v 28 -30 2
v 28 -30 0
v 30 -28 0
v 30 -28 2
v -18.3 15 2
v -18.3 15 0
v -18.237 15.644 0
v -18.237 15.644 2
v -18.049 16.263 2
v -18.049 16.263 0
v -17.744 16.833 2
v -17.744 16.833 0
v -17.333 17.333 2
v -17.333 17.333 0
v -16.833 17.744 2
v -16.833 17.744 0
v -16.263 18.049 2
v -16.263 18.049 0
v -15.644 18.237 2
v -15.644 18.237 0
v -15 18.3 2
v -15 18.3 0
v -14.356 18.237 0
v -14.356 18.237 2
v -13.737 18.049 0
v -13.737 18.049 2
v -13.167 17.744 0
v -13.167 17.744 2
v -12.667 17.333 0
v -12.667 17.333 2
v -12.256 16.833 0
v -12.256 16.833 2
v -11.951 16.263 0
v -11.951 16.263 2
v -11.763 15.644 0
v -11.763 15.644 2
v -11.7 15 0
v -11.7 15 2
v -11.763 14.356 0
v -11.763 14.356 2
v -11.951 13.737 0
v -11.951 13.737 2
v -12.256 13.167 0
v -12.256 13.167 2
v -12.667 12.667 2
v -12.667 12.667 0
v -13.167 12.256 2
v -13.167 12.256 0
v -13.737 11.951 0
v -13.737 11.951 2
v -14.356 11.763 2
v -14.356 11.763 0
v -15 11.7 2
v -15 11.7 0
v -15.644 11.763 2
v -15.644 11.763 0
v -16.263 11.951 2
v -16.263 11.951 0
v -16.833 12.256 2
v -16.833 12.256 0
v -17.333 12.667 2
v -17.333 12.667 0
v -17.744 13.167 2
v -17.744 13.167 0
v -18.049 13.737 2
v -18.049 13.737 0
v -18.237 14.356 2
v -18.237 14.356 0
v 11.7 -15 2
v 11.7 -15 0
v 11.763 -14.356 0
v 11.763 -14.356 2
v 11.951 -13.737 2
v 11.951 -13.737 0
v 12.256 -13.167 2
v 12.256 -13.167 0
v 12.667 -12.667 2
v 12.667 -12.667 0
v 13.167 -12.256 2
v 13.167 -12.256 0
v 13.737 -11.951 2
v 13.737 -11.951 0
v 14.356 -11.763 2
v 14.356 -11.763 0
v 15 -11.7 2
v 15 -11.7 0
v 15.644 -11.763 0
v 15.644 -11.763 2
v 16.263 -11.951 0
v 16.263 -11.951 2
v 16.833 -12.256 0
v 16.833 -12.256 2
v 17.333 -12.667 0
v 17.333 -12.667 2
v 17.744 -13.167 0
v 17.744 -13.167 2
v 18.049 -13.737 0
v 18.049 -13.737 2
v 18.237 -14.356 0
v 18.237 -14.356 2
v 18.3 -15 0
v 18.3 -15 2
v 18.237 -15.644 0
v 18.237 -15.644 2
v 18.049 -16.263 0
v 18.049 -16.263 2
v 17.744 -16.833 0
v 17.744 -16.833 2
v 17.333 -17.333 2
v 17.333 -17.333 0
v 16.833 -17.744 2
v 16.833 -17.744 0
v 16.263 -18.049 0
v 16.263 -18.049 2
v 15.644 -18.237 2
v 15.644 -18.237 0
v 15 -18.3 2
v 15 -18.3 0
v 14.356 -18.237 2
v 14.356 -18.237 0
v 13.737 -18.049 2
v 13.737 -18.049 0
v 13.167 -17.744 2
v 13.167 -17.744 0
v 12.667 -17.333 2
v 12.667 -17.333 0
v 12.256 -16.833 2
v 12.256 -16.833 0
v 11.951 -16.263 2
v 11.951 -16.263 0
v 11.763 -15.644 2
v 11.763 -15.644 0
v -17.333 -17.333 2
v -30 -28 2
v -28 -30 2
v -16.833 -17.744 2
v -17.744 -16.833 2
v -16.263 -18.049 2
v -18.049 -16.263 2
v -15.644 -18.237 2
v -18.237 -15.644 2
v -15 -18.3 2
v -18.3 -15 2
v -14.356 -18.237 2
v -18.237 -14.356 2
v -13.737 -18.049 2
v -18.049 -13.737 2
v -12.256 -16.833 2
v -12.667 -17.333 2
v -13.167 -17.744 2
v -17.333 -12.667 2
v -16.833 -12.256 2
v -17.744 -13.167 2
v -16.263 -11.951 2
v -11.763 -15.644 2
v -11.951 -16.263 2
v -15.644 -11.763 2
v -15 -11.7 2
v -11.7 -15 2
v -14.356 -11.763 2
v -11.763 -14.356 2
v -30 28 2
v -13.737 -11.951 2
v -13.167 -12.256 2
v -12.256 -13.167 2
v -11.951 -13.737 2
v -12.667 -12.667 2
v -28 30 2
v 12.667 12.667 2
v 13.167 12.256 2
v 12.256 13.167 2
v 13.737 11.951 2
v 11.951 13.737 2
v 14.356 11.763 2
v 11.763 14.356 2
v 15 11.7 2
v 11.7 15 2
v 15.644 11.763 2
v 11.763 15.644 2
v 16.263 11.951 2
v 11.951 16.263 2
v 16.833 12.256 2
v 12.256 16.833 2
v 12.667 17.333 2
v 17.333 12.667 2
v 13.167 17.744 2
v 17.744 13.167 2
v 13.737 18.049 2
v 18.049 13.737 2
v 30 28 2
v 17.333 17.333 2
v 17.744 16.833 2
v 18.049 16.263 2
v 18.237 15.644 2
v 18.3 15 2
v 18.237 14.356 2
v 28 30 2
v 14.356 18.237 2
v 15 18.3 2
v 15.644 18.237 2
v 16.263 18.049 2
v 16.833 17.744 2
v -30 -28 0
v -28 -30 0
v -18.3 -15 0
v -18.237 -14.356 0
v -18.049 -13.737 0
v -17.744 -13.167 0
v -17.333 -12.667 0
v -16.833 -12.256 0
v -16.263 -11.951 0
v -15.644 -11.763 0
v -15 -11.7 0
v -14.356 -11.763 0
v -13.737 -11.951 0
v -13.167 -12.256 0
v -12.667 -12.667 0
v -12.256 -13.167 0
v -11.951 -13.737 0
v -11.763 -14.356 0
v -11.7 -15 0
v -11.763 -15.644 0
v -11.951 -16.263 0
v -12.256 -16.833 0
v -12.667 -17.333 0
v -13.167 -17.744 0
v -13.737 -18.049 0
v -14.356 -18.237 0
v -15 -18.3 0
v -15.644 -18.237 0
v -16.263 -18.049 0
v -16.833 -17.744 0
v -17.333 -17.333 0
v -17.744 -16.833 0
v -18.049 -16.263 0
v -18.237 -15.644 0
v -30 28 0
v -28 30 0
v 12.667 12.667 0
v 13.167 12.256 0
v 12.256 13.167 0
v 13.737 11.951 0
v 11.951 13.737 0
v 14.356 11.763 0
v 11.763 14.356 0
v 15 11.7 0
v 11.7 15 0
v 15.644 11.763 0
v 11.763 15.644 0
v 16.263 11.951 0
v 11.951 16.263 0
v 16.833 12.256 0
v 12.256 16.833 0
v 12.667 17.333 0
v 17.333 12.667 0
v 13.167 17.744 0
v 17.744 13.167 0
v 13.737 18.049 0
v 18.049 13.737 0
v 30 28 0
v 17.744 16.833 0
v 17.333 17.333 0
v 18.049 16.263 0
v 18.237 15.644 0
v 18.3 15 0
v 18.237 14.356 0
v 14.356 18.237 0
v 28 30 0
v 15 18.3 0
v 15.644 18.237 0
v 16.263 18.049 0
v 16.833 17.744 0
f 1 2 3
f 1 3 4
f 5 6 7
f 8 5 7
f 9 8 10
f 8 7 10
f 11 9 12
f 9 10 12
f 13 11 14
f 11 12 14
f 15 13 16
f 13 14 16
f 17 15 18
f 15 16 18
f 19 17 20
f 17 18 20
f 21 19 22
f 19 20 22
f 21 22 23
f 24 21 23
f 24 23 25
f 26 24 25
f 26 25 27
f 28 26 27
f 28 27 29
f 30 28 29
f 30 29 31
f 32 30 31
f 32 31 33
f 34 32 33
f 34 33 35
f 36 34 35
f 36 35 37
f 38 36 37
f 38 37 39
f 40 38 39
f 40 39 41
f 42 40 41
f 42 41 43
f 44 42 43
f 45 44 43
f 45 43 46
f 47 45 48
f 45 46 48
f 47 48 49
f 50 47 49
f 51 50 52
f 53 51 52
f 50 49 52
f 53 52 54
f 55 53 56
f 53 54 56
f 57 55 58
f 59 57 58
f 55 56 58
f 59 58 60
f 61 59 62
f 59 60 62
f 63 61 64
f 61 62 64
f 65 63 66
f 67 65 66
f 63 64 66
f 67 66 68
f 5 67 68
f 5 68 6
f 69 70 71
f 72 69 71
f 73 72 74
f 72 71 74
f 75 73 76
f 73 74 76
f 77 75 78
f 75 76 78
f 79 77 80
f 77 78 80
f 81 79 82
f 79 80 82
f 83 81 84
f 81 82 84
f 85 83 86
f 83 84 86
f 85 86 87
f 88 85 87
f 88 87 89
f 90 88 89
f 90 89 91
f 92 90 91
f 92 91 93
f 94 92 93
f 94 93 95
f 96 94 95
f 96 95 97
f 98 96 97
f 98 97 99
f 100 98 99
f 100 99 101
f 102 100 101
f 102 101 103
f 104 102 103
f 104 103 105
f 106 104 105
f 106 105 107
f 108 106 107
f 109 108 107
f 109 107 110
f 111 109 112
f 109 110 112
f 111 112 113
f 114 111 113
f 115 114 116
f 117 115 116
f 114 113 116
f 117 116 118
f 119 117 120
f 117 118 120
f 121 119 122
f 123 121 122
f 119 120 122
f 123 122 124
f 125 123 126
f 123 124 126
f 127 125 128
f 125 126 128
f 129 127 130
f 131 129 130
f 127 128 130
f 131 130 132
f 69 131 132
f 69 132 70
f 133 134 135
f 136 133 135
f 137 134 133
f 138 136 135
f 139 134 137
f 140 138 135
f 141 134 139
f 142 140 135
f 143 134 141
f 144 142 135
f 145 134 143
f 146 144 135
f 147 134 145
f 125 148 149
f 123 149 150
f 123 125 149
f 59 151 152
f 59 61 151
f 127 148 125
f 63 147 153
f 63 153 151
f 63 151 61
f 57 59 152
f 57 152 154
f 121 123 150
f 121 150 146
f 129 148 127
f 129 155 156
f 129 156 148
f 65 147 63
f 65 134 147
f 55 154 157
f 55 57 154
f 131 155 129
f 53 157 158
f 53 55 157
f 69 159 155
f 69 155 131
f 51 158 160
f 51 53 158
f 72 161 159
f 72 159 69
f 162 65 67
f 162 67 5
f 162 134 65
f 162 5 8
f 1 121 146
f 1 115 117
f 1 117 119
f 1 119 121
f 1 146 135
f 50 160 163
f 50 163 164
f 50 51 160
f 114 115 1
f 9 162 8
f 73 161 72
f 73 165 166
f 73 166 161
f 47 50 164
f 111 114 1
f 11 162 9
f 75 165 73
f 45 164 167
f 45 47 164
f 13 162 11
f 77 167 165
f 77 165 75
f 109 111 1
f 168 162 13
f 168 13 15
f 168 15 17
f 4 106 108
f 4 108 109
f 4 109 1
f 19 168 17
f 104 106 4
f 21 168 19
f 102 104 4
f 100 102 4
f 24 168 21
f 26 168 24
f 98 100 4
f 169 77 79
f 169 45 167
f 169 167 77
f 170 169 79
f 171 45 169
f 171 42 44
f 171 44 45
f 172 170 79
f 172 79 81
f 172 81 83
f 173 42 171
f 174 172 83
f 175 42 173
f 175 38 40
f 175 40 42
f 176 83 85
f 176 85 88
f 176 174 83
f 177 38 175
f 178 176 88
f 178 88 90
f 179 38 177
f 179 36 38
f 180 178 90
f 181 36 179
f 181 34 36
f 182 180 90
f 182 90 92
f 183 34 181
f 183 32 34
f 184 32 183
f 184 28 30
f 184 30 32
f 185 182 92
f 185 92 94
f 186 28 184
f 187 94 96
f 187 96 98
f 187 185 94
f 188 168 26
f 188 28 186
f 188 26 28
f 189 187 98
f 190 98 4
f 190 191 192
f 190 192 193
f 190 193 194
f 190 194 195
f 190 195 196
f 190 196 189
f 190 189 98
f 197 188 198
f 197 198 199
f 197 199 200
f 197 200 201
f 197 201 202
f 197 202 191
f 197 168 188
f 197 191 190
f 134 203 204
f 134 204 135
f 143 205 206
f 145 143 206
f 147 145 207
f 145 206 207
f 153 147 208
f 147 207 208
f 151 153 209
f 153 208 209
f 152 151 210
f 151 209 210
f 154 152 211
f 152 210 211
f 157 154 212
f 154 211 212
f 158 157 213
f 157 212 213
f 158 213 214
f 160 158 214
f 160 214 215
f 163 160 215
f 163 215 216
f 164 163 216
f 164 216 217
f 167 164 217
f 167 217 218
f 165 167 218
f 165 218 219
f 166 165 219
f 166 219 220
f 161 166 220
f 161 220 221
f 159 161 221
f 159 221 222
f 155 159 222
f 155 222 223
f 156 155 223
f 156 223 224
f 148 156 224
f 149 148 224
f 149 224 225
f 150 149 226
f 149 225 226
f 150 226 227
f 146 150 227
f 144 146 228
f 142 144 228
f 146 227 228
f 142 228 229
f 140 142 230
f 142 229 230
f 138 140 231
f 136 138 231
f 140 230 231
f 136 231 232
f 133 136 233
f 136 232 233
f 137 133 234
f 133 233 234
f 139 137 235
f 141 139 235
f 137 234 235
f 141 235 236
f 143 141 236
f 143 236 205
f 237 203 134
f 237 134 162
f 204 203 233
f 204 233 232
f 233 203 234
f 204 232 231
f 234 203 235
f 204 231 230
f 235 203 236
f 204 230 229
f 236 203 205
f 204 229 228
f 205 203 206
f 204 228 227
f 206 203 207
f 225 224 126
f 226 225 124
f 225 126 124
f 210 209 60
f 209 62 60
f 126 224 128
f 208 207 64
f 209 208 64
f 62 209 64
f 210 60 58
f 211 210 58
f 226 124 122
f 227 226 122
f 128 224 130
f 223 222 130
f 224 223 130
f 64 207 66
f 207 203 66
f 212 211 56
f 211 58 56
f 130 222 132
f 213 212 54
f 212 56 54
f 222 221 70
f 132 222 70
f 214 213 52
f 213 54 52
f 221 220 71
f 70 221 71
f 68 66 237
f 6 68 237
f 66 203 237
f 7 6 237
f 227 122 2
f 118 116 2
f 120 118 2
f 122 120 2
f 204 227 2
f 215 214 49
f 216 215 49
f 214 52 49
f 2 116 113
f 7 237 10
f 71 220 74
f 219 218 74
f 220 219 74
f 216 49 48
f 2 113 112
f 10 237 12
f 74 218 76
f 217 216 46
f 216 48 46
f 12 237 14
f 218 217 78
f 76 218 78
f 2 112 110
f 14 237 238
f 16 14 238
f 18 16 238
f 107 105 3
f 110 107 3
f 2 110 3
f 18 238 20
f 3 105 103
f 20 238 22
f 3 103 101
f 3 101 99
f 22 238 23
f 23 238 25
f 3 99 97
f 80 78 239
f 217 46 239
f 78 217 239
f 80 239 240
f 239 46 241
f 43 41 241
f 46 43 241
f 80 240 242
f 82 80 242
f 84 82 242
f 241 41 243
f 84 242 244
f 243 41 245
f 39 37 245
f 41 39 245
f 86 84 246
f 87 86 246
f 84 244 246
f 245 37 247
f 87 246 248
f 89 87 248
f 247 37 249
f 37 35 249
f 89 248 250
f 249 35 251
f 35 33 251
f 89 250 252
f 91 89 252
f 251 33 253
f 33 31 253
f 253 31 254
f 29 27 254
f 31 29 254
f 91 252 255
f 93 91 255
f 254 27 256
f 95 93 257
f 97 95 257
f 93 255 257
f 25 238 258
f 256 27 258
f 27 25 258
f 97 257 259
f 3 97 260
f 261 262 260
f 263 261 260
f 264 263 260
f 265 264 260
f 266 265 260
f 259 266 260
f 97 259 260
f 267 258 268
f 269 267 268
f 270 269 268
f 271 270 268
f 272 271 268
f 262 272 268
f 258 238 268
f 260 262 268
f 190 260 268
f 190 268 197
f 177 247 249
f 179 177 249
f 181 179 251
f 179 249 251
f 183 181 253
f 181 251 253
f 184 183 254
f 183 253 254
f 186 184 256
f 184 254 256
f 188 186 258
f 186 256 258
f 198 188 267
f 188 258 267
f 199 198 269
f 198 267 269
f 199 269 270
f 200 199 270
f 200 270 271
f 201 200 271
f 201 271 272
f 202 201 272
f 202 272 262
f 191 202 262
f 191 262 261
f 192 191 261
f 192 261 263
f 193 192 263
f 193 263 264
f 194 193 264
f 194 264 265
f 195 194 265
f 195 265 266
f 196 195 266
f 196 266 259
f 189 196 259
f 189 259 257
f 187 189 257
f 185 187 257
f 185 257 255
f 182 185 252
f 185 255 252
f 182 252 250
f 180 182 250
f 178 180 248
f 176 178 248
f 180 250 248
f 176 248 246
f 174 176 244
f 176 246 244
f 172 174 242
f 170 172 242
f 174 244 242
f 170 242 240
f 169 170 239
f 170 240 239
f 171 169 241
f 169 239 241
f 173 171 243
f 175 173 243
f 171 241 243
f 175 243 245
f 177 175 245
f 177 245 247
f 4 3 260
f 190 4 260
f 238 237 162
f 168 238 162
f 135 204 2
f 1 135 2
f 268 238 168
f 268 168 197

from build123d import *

# Parameters (mm, degrees)
SKETCH_1_W        = 60
SKETCH_1_H        = 60
EXTRUDE_1_DEPTH   = 2
CHAMFER_1_SIZE    = 2
HOLE_WIZARD_M61_D = 6.6


with BuildPart() as part:
    # Эскиз1 → Бобышка-Вытянуть1 (new body)
    with BuildSketch(Plane.XY):
        Rectangle(SKETCH_1_W, SKETCH_1_H)
    extrude(amount=EXTRUDE_1_DEPTH)

    # Фаска1
    chamfer_1_edges = [part.edges().sort_by_distance(p)[0] for p in [
        (30, -30, 1),
        (-30, -30, 1),
        (-30, 30, 1),
        (30, 30, 1),
    ]]
    chamfer(chamfer_1_edges, length=CHAMFER_1_SIZE)

    # Отверстие с зазором M61 (through all)
    with Locations(Plane.XY.offset(2)):
        with Locations((-15, 15), (15, 15), (-15, -15), (15, -15), (-15, 45), (15, 45), (15, -45), (-15, -45)):
            Hole(HOLE_WIZARD_M61_D / 2)


solid = part.part
